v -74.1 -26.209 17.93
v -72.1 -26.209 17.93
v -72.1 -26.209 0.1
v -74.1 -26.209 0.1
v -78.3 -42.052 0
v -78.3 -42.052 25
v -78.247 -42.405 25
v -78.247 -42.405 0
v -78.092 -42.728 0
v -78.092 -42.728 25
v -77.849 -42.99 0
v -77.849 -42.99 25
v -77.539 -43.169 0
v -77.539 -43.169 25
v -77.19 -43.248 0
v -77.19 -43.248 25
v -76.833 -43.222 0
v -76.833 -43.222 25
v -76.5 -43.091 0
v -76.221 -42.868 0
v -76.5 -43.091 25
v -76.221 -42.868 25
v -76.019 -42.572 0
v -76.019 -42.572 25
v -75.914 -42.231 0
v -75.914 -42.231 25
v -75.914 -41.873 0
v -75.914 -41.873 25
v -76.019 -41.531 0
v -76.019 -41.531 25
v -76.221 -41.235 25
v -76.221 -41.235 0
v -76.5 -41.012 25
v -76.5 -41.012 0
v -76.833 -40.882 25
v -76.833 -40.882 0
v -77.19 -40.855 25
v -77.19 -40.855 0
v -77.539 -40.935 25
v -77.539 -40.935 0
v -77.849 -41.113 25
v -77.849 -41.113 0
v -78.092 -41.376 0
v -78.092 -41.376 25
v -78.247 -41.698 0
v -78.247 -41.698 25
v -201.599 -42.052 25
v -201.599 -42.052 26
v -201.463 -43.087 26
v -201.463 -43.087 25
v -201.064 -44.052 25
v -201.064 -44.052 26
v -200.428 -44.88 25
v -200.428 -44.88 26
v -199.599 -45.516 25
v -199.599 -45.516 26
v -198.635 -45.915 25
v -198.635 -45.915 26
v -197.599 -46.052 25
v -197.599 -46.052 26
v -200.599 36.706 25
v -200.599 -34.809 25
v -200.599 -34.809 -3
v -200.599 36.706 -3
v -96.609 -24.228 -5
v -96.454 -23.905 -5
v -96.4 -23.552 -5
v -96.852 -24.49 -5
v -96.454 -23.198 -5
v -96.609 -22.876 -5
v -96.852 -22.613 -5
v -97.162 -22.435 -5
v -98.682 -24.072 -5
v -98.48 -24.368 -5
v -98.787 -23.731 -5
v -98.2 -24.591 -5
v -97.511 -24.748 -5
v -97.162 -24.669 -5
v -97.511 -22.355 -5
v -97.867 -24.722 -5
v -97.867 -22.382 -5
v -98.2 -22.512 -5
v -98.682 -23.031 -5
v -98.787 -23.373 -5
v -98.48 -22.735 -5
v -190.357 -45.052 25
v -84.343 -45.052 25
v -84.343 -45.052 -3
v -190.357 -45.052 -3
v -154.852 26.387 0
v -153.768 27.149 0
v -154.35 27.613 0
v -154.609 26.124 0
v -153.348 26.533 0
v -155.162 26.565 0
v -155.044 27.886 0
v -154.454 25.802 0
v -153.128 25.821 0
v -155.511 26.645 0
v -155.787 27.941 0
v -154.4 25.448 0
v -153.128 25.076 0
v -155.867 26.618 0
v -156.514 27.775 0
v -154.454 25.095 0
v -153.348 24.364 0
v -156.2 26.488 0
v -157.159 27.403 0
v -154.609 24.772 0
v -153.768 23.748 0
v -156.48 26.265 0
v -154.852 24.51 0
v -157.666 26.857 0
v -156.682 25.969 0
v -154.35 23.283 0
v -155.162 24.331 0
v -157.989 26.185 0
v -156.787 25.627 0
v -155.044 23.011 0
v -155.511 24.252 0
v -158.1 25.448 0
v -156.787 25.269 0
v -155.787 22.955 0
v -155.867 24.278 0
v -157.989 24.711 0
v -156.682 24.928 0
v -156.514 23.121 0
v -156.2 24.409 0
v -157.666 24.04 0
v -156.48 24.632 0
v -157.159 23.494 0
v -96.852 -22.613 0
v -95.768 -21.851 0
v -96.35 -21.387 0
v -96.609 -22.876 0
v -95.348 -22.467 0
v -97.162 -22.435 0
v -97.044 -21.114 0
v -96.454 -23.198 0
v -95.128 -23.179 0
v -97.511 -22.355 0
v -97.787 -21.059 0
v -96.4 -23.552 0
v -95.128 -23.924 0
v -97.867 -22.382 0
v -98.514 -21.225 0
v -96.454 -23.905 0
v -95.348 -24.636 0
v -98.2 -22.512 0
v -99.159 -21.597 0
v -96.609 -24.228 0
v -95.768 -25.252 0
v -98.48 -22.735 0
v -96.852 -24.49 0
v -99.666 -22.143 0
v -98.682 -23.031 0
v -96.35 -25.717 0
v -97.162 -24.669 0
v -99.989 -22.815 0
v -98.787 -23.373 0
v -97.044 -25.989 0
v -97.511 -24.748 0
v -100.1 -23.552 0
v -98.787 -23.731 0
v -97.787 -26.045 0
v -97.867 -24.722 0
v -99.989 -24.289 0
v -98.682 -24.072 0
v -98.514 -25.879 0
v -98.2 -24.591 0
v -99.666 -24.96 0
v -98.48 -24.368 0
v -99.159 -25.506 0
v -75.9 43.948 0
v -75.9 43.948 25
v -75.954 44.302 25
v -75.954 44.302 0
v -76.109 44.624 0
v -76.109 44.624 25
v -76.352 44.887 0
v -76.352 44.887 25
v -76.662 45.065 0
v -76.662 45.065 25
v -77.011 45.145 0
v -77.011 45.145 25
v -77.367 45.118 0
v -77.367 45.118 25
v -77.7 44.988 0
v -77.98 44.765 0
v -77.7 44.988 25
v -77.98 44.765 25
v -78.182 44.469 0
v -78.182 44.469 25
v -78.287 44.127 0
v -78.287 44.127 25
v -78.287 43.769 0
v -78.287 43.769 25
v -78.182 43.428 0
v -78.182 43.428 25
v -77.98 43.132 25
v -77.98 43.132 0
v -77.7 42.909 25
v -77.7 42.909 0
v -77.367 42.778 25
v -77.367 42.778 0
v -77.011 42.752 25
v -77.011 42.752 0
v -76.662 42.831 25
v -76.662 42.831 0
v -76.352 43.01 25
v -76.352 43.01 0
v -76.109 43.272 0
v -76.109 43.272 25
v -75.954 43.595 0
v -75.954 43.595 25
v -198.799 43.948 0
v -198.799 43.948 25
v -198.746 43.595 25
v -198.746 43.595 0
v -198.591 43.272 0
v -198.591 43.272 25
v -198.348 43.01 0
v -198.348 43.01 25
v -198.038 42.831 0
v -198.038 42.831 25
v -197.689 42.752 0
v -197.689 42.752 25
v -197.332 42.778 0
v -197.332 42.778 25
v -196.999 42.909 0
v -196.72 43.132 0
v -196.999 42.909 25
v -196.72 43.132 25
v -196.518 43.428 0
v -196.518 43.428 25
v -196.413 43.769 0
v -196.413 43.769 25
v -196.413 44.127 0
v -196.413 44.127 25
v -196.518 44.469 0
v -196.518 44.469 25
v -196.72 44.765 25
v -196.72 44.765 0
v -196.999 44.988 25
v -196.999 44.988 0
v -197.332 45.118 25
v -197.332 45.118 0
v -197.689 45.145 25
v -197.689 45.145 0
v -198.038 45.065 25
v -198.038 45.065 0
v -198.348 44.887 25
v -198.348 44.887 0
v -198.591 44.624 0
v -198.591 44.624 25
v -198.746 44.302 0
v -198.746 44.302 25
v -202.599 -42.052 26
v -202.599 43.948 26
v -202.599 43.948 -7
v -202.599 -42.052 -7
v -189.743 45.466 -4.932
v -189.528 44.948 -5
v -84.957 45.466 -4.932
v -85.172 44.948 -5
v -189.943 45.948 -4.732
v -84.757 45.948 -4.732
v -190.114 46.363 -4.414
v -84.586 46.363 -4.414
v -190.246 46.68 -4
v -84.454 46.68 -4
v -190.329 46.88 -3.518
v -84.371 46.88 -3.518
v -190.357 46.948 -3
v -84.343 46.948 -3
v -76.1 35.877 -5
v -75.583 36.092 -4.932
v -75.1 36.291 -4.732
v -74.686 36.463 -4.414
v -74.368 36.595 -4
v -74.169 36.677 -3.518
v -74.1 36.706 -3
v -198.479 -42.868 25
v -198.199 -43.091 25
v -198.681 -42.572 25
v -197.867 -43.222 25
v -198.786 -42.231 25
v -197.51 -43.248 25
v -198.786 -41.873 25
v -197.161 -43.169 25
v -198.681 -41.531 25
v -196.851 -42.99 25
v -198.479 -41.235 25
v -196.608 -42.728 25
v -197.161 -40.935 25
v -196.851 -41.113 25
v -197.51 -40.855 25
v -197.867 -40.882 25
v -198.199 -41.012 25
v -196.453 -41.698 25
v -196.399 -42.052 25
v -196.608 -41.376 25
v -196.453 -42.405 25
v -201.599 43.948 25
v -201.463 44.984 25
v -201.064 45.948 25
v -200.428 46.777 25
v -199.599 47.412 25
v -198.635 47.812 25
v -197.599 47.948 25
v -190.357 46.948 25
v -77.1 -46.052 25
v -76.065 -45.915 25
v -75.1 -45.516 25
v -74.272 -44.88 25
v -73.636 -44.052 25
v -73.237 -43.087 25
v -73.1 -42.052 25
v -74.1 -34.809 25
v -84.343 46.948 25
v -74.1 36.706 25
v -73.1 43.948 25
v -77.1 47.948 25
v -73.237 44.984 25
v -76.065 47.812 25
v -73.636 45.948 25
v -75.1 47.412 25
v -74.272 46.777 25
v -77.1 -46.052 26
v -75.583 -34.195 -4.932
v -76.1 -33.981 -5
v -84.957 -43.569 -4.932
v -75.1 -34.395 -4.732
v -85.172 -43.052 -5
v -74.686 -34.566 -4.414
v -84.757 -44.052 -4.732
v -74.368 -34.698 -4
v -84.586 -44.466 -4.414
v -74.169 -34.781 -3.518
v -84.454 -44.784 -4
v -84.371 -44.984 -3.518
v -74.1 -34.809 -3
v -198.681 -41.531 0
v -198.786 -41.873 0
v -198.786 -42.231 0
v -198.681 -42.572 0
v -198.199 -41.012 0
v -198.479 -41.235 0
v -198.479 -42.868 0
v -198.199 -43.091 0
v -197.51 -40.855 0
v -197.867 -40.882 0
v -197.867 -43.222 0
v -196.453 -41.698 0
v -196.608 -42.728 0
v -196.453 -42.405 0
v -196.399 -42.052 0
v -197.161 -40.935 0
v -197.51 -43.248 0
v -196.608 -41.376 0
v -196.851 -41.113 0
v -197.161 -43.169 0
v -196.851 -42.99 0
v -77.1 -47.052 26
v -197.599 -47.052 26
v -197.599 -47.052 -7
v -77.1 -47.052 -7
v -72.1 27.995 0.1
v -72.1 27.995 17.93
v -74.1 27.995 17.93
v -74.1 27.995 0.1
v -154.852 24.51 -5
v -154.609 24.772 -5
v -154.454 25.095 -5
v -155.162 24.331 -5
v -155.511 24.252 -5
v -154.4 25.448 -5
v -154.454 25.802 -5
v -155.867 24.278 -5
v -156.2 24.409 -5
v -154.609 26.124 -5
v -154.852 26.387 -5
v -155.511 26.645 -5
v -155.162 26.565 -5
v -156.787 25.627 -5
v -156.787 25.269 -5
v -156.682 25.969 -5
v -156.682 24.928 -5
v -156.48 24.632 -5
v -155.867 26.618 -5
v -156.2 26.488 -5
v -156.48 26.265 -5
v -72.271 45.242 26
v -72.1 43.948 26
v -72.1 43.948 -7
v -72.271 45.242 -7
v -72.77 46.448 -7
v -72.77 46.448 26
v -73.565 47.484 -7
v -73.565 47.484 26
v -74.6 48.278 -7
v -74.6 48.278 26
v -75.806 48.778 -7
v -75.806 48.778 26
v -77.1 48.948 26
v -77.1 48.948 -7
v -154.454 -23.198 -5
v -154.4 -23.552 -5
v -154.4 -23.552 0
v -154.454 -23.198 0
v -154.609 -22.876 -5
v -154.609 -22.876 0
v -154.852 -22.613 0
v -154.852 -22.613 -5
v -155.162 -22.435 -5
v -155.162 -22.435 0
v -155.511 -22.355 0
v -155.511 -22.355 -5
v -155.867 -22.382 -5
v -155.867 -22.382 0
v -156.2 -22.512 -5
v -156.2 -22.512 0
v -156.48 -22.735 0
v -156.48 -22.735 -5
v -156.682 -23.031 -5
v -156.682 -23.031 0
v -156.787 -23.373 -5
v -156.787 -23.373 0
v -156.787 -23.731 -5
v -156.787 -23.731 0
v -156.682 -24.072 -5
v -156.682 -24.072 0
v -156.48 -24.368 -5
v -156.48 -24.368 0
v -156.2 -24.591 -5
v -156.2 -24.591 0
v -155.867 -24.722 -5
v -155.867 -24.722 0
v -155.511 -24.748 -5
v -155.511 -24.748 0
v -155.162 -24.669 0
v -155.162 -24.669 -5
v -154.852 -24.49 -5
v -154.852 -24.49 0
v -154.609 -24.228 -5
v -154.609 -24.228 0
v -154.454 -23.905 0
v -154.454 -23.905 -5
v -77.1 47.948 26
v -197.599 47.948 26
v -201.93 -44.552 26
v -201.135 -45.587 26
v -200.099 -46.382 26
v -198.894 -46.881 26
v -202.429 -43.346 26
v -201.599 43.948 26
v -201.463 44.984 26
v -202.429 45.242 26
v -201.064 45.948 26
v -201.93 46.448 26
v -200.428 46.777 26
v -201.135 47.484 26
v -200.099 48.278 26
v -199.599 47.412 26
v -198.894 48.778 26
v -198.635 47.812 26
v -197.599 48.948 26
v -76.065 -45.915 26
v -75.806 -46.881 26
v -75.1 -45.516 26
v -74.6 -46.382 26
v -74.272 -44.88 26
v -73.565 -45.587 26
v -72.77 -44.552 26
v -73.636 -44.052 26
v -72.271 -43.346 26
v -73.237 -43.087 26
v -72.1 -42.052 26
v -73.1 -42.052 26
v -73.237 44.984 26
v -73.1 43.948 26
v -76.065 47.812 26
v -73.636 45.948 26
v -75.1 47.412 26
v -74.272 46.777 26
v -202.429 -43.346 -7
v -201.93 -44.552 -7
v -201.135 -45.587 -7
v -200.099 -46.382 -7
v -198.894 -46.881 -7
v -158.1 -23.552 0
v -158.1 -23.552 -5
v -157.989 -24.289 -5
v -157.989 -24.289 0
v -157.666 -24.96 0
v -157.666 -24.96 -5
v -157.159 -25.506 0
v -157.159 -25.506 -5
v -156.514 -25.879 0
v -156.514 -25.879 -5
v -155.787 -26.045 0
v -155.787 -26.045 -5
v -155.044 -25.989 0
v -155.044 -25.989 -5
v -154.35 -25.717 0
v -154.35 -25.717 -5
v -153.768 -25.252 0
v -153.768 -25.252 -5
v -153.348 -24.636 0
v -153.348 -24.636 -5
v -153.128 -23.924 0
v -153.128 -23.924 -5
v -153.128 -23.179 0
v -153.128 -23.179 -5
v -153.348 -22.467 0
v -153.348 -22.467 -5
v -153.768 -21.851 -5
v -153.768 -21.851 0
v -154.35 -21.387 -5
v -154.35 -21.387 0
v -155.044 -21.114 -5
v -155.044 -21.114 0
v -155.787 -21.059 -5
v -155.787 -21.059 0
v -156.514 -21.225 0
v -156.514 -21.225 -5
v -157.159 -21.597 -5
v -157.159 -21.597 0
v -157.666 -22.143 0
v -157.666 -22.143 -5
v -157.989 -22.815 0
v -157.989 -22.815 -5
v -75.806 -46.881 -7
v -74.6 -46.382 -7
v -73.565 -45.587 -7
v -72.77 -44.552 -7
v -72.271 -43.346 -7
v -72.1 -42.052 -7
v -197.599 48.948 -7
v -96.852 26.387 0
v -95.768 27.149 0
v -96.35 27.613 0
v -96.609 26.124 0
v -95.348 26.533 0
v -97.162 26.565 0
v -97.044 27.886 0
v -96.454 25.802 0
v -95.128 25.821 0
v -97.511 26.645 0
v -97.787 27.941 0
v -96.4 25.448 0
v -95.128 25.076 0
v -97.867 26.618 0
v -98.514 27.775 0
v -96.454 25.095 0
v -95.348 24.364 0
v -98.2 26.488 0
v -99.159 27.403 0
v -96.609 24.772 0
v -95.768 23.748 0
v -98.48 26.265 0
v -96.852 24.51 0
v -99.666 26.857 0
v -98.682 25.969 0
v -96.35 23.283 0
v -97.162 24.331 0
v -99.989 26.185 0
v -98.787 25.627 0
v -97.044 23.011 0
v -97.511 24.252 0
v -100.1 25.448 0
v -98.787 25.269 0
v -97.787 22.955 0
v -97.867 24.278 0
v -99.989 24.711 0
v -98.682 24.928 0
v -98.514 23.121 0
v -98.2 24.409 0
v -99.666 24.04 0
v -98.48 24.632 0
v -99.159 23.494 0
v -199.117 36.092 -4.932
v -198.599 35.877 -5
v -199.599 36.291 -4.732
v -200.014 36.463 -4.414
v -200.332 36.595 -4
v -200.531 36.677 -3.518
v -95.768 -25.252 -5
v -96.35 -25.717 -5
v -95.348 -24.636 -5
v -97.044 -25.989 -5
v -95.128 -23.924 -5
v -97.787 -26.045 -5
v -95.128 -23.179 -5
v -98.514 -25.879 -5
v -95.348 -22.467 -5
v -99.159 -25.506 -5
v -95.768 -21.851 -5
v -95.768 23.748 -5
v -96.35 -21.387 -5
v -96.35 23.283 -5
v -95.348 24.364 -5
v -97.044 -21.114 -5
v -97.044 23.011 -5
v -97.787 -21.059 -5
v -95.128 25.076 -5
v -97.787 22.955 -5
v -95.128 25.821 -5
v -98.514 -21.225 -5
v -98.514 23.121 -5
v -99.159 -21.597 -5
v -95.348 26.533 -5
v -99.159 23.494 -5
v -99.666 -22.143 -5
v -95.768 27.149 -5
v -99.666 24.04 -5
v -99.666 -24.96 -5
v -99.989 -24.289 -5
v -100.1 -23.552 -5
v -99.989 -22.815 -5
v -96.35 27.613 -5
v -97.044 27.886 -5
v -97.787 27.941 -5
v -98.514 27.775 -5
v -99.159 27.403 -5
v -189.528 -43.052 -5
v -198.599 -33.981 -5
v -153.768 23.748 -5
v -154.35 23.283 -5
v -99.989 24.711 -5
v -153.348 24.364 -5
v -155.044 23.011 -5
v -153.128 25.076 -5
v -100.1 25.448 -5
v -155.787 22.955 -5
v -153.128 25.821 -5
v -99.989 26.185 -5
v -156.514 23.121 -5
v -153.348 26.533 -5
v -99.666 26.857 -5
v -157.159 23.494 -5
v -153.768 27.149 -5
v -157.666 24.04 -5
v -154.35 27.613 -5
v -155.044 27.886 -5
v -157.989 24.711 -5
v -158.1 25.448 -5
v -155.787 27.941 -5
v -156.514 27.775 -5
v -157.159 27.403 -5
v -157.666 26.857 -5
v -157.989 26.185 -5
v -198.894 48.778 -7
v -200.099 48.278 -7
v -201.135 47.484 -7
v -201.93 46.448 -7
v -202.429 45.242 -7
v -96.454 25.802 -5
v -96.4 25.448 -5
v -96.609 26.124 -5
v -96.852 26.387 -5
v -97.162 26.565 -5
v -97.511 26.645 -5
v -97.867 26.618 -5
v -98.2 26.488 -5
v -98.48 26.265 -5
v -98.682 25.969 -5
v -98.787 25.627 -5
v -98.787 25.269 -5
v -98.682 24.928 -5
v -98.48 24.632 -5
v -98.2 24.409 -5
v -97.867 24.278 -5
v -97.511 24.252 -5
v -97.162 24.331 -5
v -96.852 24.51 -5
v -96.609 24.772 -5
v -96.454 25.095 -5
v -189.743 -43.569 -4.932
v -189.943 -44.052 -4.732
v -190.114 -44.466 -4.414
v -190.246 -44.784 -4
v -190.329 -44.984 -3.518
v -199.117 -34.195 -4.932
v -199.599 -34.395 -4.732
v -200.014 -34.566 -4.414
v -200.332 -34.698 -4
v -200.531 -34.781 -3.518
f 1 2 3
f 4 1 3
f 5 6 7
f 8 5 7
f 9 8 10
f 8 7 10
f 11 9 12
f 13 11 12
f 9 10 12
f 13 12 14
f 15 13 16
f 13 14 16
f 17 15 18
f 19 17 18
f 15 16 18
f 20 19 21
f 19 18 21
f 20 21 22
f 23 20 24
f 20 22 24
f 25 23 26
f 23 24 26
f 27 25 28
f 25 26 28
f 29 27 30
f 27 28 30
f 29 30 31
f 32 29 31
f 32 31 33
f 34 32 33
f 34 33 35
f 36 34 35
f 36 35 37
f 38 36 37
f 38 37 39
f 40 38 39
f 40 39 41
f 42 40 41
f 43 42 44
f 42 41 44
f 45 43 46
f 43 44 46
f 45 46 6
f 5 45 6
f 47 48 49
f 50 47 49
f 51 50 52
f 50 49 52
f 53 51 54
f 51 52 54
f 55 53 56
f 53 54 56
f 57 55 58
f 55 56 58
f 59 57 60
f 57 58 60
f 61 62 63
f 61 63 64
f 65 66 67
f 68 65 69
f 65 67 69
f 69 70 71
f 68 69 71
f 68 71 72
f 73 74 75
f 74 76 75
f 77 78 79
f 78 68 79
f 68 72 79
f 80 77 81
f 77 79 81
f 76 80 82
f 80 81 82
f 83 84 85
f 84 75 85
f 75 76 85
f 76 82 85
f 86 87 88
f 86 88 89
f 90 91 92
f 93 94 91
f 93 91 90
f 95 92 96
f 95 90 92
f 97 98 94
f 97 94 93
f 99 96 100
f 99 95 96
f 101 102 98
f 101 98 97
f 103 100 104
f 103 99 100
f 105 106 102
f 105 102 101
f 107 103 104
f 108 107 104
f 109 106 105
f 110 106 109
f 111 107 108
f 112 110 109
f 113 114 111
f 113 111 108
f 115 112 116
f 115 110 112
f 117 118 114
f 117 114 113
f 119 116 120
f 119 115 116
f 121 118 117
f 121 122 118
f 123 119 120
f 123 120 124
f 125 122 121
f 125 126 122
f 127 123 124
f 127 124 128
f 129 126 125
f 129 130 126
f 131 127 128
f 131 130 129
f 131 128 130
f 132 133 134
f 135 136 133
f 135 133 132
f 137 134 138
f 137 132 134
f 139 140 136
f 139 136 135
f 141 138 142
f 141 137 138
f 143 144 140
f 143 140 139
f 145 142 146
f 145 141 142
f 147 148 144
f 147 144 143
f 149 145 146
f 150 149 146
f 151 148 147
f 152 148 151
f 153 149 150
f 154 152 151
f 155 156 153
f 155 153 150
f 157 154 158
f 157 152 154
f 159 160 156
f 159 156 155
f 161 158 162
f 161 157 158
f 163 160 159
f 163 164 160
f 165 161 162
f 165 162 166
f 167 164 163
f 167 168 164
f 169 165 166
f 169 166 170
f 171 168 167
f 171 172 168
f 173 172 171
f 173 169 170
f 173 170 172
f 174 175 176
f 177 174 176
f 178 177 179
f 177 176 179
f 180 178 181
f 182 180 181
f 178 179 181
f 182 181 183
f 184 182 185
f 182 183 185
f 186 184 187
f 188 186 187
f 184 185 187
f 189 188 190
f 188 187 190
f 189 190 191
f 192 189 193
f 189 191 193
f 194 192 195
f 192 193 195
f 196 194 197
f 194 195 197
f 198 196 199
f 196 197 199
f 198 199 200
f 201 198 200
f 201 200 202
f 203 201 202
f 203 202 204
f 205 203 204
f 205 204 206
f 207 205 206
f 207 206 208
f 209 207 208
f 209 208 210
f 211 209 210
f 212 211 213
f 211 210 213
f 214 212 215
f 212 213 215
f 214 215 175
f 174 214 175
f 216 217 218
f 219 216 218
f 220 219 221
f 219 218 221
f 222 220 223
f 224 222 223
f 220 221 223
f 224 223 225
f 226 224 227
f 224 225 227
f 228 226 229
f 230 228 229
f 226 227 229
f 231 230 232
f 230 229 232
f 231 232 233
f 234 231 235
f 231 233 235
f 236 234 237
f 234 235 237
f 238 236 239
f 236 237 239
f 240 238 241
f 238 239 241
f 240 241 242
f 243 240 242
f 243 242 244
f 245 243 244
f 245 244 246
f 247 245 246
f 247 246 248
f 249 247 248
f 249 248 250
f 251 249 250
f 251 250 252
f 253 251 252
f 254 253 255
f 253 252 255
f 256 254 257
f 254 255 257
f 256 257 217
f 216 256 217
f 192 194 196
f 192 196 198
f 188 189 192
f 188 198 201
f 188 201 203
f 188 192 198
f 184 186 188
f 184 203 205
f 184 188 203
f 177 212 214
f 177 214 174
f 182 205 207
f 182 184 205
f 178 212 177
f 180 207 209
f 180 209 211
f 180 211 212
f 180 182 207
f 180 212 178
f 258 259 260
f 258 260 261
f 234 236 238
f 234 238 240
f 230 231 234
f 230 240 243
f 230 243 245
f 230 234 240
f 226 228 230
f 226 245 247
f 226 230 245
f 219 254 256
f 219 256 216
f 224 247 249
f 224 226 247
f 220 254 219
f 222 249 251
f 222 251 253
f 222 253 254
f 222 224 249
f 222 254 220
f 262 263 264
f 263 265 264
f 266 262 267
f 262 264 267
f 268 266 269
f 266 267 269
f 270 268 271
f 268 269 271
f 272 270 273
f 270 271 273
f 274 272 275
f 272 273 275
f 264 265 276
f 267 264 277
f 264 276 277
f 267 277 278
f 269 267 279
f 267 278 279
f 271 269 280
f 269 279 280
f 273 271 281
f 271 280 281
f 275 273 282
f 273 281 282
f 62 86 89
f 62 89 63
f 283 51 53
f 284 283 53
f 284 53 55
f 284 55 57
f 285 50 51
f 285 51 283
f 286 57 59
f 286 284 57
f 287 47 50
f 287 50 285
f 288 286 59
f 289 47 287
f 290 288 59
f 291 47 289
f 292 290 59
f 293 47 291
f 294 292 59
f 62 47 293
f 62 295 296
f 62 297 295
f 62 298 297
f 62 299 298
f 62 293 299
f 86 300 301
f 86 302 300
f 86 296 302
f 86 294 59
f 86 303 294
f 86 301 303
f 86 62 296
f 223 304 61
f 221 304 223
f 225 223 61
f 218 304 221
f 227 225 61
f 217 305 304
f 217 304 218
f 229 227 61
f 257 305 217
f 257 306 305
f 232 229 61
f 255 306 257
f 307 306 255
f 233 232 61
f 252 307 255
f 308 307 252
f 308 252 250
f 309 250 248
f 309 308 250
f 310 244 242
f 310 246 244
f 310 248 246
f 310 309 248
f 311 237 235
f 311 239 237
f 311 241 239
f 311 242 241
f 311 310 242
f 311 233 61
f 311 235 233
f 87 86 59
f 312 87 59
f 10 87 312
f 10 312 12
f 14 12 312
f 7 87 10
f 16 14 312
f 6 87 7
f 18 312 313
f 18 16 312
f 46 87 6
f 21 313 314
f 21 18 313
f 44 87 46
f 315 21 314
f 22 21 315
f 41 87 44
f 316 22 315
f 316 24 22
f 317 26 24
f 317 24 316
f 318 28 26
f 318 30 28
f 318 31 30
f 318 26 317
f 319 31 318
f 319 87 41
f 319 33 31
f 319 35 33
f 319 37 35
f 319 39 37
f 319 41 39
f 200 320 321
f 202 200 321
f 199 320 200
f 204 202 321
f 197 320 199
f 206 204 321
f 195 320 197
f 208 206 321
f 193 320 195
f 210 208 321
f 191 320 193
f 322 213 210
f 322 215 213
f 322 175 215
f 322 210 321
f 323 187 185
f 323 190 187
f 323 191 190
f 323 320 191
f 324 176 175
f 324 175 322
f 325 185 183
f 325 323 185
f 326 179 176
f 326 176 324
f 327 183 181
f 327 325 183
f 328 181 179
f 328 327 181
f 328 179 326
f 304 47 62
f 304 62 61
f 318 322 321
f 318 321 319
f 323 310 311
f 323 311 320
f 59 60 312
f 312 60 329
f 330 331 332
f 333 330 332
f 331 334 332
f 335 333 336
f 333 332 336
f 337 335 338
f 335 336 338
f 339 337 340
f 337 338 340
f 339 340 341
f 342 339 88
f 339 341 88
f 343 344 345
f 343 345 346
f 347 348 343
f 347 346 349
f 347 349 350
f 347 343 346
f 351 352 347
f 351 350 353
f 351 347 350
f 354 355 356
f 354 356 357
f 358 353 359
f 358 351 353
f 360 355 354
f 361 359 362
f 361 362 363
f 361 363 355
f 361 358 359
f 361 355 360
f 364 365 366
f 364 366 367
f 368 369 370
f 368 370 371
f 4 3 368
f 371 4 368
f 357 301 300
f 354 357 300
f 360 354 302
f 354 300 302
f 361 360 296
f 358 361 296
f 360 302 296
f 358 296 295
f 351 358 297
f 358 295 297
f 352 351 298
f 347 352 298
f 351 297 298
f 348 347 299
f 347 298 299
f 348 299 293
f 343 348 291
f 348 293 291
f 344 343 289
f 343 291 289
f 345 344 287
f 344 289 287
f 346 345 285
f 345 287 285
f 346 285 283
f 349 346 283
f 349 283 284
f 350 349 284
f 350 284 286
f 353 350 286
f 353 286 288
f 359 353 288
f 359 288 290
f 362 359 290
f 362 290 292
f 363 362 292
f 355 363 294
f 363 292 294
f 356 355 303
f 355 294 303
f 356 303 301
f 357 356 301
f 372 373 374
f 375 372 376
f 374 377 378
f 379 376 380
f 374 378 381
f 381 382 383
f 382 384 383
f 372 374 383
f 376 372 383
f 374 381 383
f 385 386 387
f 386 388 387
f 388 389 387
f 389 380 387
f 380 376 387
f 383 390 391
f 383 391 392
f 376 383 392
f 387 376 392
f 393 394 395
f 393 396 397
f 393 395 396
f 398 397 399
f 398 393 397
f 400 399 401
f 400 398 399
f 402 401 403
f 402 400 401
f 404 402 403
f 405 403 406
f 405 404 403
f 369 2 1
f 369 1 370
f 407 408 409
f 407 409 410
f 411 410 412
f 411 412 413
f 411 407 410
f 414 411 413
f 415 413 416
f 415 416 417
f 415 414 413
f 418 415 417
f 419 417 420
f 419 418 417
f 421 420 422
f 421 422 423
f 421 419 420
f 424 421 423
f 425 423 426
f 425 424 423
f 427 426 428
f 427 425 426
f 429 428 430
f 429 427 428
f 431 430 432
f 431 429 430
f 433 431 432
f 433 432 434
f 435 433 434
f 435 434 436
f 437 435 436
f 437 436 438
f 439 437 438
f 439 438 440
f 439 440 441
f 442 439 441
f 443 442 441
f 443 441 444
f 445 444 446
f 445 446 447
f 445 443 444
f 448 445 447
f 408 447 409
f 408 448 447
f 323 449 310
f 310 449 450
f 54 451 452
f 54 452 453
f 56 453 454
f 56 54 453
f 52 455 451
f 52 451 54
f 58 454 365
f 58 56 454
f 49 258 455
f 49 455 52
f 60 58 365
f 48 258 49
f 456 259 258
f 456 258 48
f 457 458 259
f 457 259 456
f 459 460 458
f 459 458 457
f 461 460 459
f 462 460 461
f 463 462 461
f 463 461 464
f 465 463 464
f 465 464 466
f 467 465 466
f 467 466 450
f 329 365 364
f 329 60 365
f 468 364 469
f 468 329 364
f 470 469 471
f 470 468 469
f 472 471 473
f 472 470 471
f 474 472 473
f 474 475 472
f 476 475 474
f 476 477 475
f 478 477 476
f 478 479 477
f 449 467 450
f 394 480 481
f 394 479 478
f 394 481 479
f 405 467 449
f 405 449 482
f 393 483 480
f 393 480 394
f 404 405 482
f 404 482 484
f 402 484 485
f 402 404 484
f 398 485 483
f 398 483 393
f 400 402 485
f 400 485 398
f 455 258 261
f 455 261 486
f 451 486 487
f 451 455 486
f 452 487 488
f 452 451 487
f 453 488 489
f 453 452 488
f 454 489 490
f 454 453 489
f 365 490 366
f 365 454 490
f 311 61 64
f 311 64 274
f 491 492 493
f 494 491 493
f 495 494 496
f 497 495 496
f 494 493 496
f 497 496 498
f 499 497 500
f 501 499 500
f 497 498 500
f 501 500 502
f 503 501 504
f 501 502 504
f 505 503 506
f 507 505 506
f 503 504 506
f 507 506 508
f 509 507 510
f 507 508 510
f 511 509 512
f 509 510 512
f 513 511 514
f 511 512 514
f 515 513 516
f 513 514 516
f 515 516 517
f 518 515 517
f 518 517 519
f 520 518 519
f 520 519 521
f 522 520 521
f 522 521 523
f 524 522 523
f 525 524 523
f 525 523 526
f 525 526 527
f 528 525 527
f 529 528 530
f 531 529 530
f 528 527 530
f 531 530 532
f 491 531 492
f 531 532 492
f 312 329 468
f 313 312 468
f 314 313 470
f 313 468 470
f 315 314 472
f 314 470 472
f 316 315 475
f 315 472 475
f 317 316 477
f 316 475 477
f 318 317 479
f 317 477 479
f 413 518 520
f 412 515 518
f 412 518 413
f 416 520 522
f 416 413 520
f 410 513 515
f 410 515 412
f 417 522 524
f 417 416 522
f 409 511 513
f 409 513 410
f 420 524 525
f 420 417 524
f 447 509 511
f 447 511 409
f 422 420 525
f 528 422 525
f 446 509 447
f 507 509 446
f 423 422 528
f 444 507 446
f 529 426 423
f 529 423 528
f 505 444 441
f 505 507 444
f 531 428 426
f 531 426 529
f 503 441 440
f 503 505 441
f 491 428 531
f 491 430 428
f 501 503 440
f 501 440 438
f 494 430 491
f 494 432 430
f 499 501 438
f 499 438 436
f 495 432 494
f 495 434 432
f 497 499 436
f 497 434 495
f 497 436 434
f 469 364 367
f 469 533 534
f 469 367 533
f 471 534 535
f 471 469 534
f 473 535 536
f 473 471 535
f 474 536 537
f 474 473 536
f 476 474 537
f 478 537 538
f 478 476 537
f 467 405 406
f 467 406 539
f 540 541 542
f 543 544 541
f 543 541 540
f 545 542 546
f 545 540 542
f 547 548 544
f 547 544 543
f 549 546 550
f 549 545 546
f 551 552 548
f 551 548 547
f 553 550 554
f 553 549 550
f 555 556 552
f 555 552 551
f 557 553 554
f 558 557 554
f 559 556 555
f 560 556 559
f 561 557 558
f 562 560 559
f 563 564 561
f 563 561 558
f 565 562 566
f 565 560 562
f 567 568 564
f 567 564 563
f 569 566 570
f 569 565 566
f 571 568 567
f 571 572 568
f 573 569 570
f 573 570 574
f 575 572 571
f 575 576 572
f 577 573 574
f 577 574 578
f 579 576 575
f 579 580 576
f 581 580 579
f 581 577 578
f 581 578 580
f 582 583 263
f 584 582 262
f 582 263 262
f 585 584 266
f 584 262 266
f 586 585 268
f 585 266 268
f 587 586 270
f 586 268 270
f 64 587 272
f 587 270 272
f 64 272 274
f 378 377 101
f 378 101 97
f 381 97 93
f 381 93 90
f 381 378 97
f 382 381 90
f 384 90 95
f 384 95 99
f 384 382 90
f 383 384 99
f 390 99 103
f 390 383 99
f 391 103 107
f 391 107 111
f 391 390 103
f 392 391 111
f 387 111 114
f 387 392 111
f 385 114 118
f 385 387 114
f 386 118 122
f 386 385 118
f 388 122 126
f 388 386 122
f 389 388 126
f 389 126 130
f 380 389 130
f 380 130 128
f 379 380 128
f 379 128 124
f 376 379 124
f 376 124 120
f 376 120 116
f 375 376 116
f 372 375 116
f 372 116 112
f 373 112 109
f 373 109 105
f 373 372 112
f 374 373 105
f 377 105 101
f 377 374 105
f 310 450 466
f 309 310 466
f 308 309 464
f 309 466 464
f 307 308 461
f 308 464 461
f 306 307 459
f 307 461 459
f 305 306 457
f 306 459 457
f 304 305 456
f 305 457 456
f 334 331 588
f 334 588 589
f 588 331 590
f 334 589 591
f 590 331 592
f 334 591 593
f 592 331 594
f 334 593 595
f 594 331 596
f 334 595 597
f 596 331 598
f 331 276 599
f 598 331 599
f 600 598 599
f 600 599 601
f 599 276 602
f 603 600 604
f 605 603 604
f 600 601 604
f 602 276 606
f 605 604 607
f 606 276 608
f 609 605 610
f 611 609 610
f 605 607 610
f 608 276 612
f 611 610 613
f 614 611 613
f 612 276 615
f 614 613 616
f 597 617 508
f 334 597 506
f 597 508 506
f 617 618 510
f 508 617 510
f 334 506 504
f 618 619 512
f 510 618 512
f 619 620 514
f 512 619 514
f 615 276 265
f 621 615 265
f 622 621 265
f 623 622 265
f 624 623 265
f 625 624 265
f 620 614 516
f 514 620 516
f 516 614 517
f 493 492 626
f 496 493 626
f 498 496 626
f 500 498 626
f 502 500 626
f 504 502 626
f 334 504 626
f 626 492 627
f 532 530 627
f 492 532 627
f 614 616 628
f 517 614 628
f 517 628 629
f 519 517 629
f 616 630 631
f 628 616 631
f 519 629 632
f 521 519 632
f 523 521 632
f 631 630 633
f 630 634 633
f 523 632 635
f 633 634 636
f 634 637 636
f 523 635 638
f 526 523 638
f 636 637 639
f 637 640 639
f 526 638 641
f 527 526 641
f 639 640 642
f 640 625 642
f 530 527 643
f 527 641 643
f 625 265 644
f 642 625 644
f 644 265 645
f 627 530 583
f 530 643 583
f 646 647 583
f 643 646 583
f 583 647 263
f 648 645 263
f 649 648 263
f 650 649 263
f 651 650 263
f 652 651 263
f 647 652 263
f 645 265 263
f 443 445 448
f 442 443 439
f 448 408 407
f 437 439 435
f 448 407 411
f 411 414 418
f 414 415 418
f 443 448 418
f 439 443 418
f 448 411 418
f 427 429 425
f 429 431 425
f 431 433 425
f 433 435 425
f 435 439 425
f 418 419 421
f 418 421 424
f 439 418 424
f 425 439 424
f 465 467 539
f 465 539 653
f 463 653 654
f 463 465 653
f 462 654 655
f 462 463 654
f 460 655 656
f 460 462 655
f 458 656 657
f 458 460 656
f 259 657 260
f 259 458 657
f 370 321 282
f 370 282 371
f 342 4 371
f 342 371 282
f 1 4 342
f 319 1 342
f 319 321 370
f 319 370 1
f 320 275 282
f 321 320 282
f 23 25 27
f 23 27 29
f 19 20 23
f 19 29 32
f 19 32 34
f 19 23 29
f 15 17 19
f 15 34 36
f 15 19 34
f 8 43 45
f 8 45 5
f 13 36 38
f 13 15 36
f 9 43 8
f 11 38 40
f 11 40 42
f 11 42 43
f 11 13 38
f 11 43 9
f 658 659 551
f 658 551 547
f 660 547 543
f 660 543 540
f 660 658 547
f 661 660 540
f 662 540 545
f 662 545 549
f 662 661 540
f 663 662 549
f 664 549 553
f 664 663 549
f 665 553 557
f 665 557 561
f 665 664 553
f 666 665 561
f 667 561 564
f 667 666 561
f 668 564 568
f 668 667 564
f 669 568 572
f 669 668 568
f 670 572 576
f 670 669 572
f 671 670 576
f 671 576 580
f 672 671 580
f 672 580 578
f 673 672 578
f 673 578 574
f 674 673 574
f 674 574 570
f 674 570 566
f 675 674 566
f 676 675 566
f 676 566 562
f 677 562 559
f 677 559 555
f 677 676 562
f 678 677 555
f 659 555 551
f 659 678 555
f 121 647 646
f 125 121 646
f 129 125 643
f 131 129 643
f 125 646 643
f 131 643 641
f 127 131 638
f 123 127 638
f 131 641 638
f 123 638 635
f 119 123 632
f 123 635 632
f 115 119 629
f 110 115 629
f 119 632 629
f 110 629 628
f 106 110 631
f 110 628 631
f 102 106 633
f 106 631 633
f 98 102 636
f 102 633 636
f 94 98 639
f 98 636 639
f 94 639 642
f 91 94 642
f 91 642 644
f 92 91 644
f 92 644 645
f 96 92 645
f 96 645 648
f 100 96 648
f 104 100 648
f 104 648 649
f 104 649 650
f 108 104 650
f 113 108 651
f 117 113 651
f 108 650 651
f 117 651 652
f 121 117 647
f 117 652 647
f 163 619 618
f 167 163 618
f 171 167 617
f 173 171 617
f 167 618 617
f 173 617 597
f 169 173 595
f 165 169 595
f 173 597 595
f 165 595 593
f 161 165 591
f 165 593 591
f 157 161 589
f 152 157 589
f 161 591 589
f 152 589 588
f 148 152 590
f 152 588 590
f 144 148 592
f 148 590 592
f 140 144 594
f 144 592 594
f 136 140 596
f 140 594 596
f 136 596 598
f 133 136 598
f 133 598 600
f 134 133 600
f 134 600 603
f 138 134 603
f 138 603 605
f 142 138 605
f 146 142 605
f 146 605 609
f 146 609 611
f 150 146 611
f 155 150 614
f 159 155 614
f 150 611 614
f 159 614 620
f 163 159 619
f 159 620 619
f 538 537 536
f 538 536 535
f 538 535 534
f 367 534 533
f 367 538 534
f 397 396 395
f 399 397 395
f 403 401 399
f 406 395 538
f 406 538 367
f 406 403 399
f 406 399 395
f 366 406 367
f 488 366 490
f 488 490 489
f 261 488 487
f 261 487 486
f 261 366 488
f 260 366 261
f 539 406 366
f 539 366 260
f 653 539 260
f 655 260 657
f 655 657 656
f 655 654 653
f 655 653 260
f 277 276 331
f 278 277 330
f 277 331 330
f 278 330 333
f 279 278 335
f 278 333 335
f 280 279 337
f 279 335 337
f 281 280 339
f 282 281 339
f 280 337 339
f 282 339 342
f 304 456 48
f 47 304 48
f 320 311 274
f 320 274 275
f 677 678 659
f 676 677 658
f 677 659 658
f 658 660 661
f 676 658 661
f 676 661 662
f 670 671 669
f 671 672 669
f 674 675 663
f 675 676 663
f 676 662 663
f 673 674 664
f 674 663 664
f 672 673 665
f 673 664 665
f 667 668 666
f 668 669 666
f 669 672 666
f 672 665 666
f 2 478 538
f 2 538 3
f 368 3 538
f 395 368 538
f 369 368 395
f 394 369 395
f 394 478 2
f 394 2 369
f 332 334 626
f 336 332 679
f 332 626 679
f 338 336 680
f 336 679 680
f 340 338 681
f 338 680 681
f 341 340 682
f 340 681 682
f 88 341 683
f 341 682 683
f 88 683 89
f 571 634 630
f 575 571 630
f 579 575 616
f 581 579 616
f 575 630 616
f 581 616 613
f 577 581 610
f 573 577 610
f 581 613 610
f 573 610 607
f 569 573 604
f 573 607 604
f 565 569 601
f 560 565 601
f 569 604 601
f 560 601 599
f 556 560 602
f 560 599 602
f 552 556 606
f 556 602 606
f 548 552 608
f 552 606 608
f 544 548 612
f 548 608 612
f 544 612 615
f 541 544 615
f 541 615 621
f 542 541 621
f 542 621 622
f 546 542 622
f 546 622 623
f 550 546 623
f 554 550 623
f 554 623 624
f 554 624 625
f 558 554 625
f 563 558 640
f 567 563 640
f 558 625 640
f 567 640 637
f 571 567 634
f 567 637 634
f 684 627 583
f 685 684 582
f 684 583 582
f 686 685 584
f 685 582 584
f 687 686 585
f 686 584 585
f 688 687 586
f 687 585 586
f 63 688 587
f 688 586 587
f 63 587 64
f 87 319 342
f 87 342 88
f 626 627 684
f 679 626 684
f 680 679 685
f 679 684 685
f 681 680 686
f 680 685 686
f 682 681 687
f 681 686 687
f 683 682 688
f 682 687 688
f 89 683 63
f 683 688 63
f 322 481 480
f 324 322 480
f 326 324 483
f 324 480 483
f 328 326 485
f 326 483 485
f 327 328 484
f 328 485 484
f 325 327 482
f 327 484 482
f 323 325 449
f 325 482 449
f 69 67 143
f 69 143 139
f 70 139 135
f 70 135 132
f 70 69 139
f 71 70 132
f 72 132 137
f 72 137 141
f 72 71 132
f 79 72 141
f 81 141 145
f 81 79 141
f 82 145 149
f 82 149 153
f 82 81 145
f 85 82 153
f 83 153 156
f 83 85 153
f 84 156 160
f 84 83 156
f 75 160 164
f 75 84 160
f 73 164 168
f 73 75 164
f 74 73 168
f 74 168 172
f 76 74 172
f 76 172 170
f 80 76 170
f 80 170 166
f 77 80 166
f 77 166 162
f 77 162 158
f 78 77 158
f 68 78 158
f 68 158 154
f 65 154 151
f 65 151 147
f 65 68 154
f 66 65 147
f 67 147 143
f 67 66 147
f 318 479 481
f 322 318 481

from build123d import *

# Parameters (mm, degrees)
BOSS_EXTRUDE1_DEPTH = 2
BOSS_EXTRUDE2_START = 30
SKETCH2_R           = 3
BOSS_EXTRUDE2_DEPTH = 30
SKETCH3_R           = 1.2
CUT_EXTRUDE1_DEPTH  = 25
BOSS_EXTRUDE3_START = 1
BOSS_EXTRUDE3_DEPTH = 1
SKETCH6_W           = 17.83
SKETCH6_H           = 54.204820934
CUT_EXTRUDE2_DEPTH  = 2
SKETCH7_R           = 2.5
SKETCH7_R_2         = 1.375
SKETCH7_R_3         = 1.2
BOSS_EXTRUDE4_DEPTH = 5
FILLET1_R           = 2


with BuildPart() as part:
    # Sketch1 → Boss-Extrude1 (new body)
    with BuildSketch(Plane(origin=(0, 0, -5), x_dir=(-1, 0, 0), z_dir=(0, 0, -1))):
        with BuildLine():
            Line((77.100439502, -47.051685991), (197.59949644, -47.051685991))
            ThreePointArc((197.59949644, -47.051685991), (201.135030346, -45.587219897), (202.59949644, -42.051685991))
            Line((202.59949644, -42.051685991), (202.59949644, 43.948314009))
            ThreePointArc((202.59949644, 43.948314009), (201.135030346, 47.483847915), (197.59949644, 48.948314009))
            Line((197.59949644, 48.948314009), (77.100439502, 48.948314009))
            ThreePointArc((77.100439502, 48.948314009), (73.564905596, 47.483847915), (72.100439502, 43.948314009))
            Line((72.100439502, 43.948314009), (72.100439502, -42.051685991))
            ThreePointArc((72.100439502, -42.051685991), (73.564905596, -45.587219897), (77.100439502, -47.051685991))
        make_face()
    extrude(amount=BOSS_EXTRUDE1_DEPTH)

    # Sketch2 → Boss-Extrude2 (add)
    # profile 1 of 7: a face of its own
    with BuildSketch(Plane.XY.offset(-5).offset(BOSS_EXTRUDE2_START)):
        with BuildLine():
            ThreePointArc((-202.59949644, -42.051685991), (-201.135030346, -45.587219897), (-197.59949644, -47.051685991))
            Line((-197.59949644, -47.051685991), (-77.100439502, -47.051685991))
            ThreePointArc((-77.100439502, -47.051685991), (-73.564905596, -45.587219897), (-72.100439502, -42.051685991))
            Line((-72.100439502, -42.051685991), (-72.100439502, 43.948314009))
            ThreePointArc((-72.100439502, 43.948314009), (-73.564905596, 47.483847915), (-77.100439502, 48.948314009))
            Line((-77.100439502, 48.948314009), (-197.59949644, 48.948314009))
            ThreePointArc((-197.59949644, 48.948314009), (-201.135030346, 47.483847915), (-202.59949644, 43.948314009))
            Line((-202.59949644, 43.948314009), (-202.59949644, -42.051685991))
        make_face()
        with BuildLine():
            Line((-74.100439502, -34.809045304), (-74.100439502, -42.051685991))
            ThreePointArc((-74.100439502, -42.051685991), (-74.979119158, -44.173006334), (-77.100439502, -45.051685991))
            Line((-77.100439502, -45.051685991), (-84.343080189, -45.051685991))
            Line((-84.343080189, -45.051685991), (-190.356855753, -45.051685991))
            Line((-190.356855753, -45.051685991), (-197.59949644, -45.051685991))
            ThreePointArc((-197.59949644, -45.051685991), (-199.720816783, -44.173006334), (-200.59949644, -42.051685991))
            Line((-200.59949644, -42.051685991), (-200.59949644, -34.809045304))
            Line((-200.59949644, -34.809045304), (-200.59949644, 36.705673322))
            Line((-200.59949644, 36.705673322), (-200.59949644, 43.948314009))
            ThreePointArc((-200.59949644, 43.948314009), (-199.720816783, 46.069634353), (-197.59949644, 46.948314009))
            Line((-197.59949644, 46.948314009), (-190.356855753, 46.948314009))
            Line((-190.356855753, 46.948314009), (-84.343080189, 46.948314009))
            Line((-84.343080189, 46.948314009), (-77.100439502, 46.948314009))
            ThreePointArc((-77.100439502, 46.948314009), (-74.979119158, 46.069634353), (-74.100439502, 43.948314009))
            Line((-74.100439502, 43.948314009), (-74.100439502, 36.705673322))
            Line((-74.100439502, 36.705673322), (-74.100439502, -34.809045304))
        make_face(mode=Mode.SUBTRACT)
    # profile 2 of 7: a face of its own
    with BuildSketch(Plane.XY.offset(-5).offset(BOSS_EXTRUDE2_START)):
        with BuildLine():
            Line((-197.59949644, -45.051685991), (-190.356855753, -45.051685991))
            Line((-190.356855753, -45.051685991), (-200.59949644, -34.809045304))
            Line((-200.59949644, -34.809045304), (-200.59949644, -42.051685991))
            ThreePointArc((-200.59949644, -42.051685991), (-199.720816783, -44.173006334), (-197.59949644, -45.051685991))
        make_face()
    # profile 3 of 7: a face of its own
    with BuildSketch(Plane.XY.offset(-5).offset(BOSS_EXTRUDE2_START)):
        with BuildLine():
            Line((-200.59949644, 36.705673322), (-190.356855753, 46.948314009))
            Line((-190.356855753, 46.948314009), (-197.59949644, 46.948314009))
            ThreePointArc((-197.59949644, 46.948314009), (-199.720816783, 46.069634353), (-200.59949644, 43.948314009))
            Line((-200.59949644, 43.948314009), (-200.59949644, 36.705673322))
        make_face()
    # profile 4 of 7: a face of its own
    with BuildSketch(Plane.XY.offset(-5).offset(BOSS_EXTRUDE2_START)):
        with BuildLine():
            Line((-84.343080189, 46.948314009), (-74.100439502, 36.705673322))
            Line((-74.100439502, 36.705673322), (-74.100439502, 43.948314009))
            ThreePointArc((-74.100439502, 43.948314009), (-74.979119158, 46.069634353), (-77.100439502, 46.948314009))
            Line((-77.100439502, 46.948314009), (-84.343080189, 46.948314009))
        make_face()
    # profile 5 of 7: a face of its own
    with BuildSketch(Plane.XY.offset(-5).offset(BOSS_EXTRUDE2_START)):
        with BuildLine():
            ThreePointArc((-79.221759818, -39.93036562), (-75.952389187, -39.280047401), (-74.100439502, -42.051685991))
            Line((-74.100439502, -42.051685991), (-74.100439502, -34.809045304))
            Line((-74.100439502, -34.809045304), (-79.221759818, -39.93036562))
        make_face()
    # profile 6 of 7: a face of its own
    with BuildSketch(Plane.XY.offset(-5).offset(BOSS_EXTRUDE2_START)):
        with Locations((-77.100439502, -42.051685991)):
            Circle(SKETCH2_R)
    # profile 7 of 7: a face of its own
    with BuildSketch(Plane.XY.offset(-5).offset(BOSS_EXTRUDE2_START)):
        with BuildLine():
            Line((-84.343080189, -45.051685991), (-77.100439502, -45.051685991))
            ThreePointArc((-77.100439502, -45.051685991), (-79.872078107, -43.19973627), (-79.221759818, -39.93036562))
            Line((-79.221759818, -39.93036562), (-84.343080189, -45.051685991))
        make_face()
    extrude(amount=-BOSS_EXTRUDE2_DEPTH)

    # Sketch3 → Cut-Extrude1 (cut)
    with BuildSketch(Plane.XY.offset(25)):
        with Locations((-197.59949644, -42.051685991)):
            Circle(SKETCH3_R)
        with Locations(Location((-77.100439502, -42.051685991, 0), (0, 0, 180))):
            Circle(SKETCH3_R)
        with Locations(Location((-197.59949644, 43.948314009, 0), (0, 0, 180))):
            Circle(SKETCH3_R)
        with Locations((-77.100439502, 43.948314009)):
            Circle(SKETCH3_R)
    extrude(amount=-CUT_EXTRUDE1_DEPTH, mode=Mode.SUBTRACT)

    # Sketch4 → Boss-Extrude3 (add)
    with BuildSketch(Plane.XY.offset(25).offset(BOSS_EXTRUDE3_START)):
        with BuildLine():
            Line((-202.59949644, 43.948314009), (-202.59949644, -42.051685991))
            ThreePointArc((-202.59949644, -42.051685991), (-201.135030346, -45.587219897), (-197.59949644, -47.051685991))
            Line((-197.59949644, -47.051685991), (-77.100439502, -47.051685991))
            ThreePointArc((-77.100439502, -47.051685991), (-73.564905596, -45.587219897), (-72.100439502, -42.051685991))
            Line((-72.100439502, -42.051685991), (-72.100439502, 43.948314009))
            ThreePointArc((-72.100439502, 43.948314009), (-73.564905596, 47.483847915), (-77.100439502, 48.948314009))
            Line((-77.100439502, 48.948314009), (-197.59949644, 48.948314009))
            ThreePointArc((-197.59949644, 48.948314009), (-201.135030346, 47.483847915), (-202.59949644, 43.948314009))
        make_face()
        with BuildLine():
            Line((-201.59949644, 43.948314009), (-201.59949644, -42.051685991))
            ThreePointArc((-201.59949644, -42.051685991), (-200.427923565, -44.880113116), (-197.59949644, -46.051685991))
            Line((-197.59949644, -46.051685991), (-77.100439502, -46.051685991))
            ThreePointArc((-77.100439502, -46.051685991), (-74.272012377, -44.880113116), (-73.100439502, -42.051685991))
            Line((-73.100439502, -42.051685991), (-73.100439502, 43.948314009))
            ThreePointArc((-73.100439502, 43.948314009), (-74.272012377, 46.776741134), (-77.100439502, 47.948314009))
            Line((-77.100439502, 47.948314009), (-197.59949644, 47.948314009))
            ThreePointArc((-197.59949644, 47.948314009), (-200.427923565, 46.776741134), (-201.59949644, 43.948314009))
        make_face(mode=Mode.SUBTRACT)
    extrude(amount=-BOSS_EXTRUDE3_DEPTH)

    # Sketch6 → Cut-Extrude2 (cut)
    with BuildSketch(Plane(origin=(-72.100439502, 0, 0), x_dir=(0, 0, -1), z_dir=(1, 0, 0))):
        with Locations((-9.015, 0.893058013)):
            Rectangle(SKETCH6_W, SKETCH6_H)
    extrude(amount=-CUT_EXTRUDE2_DEPTH, mode=Mode.SUBTRACT)

    # Sketch7 → Boss-Extrude4 (add)
    # profile 1 of 8: a face of its own
    with BuildSketch(Plane.XY.offset(-5)):
        with Locations(Location((-155.600439502, -23.551685991, 0), (0, 0, 180))):
            Circle(SKETCH7_R)
        with Locations((-155.600439502, -23.551685991)):
            Circle(SKETCH7_R_2, mode=Mode.SUBTRACT)
    # profile 2 of 8: a face of its own
    with BuildSketch(Plane.XY.offset(-5)):
        with Locations((-155.600439502, -23.551685991)):
            Circle(SKETCH7_R_2)
        with Locations((-155.600439502, -23.551685991)):
            Circle(SKETCH7_R_3, mode=Mode.SUBTRACT)
    # profile 3 of 8: a face of its own
    with BuildSketch(Plane.XY.offset(-5)):
        with Locations(Location((-155.600439502, 25.448314009, 0), (0, 0, 180))):
            Circle(SKETCH7_R)
        with Locations((-155.600439502, 25.448314009)):
            Circle(SKETCH7_R_2, mode=Mode.SUBTRACT)
    # profile 4 of 8: a face of its own
    with BuildSketch(Plane.XY.offset(-5)):
        with Locations((-155.600439502, 25.448314009)):
            Circle(SKETCH7_R_2)
        with Locations((-155.600439502, 25.448314009)):
            Circle(SKETCH7_R_3, mode=Mode.SUBTRACT)
    # profile 5 of 8: a face of its own
    with BuildSketch(Plane.XY.offset(-5)):
        with Locations(Location((-97.600439502, 25.448314009, 0), (0, 0, 180))):
            Circle(SKETCH7_R)
        with Locations((-97.600439502, 25.448314009)):
            Circle(SKETCH7_R_2, mode=Mode.SUBTRACT)
    # profile 6 of 8: a face of its own
    with BuildSketch(Plane.XY.offset(-5)):
        with Locations((-97.600439502, 25.448314009)):
            Circle(SKETCH7_R_2)
        with Locations((-97.600439502, 25.448314009)):
            Circle(SKETCH7_R_3, mode=Mode.SUBTRACT)
    # profile 7 of 8: a face of its own
    with BuildSketch(Plane.XY.offset(-5)):
        with Locations(Location((-97.600439502, -23.551685991, 0), (0, 0, 180))):
            Circle(SKETCH7_R)
        with Locations((-97.600439502, -23.551685991)):
            Circle(SKETCH7_R_2, mode=Mode.SUBTRACT)
    # profile 8 of 8: a face of its own
    with BuildSketch(Plane.XY.offset(-5)):
        with Locations((-97.600439502, -23.551685991)):
            Circle(SKETCH7_R_2)
        with Locations((-97.600439502, -23.551685991)):
            Circle(SKETCH7_R_3, mode=Mode.SUBTRACT)
    extrude(amount=BOSS_EXTRUDE4_DEPTH)

    # Fillet1
    fillet1_edges = [part.edges().sort_by_distance(p)[0] for p in [
        (-79.221759845, -39.930365647, -5),
        (-195.478176096, 41.826993666, -5),
        (-74.100439502, 0.948314009, -5),
        (-79.221759845, 41.826993666, -5),
        (-137.349967971, 46.948314009, -5),
        (-200.59949644, 0.948314009, -5),
        (-195.478176096, -39.930365647, -5),
        (-137.349967971, -45.051685991, -5),
    ]]
    fillet(fillet1_edges, radius=FILLET1_R)


solid = part.part
